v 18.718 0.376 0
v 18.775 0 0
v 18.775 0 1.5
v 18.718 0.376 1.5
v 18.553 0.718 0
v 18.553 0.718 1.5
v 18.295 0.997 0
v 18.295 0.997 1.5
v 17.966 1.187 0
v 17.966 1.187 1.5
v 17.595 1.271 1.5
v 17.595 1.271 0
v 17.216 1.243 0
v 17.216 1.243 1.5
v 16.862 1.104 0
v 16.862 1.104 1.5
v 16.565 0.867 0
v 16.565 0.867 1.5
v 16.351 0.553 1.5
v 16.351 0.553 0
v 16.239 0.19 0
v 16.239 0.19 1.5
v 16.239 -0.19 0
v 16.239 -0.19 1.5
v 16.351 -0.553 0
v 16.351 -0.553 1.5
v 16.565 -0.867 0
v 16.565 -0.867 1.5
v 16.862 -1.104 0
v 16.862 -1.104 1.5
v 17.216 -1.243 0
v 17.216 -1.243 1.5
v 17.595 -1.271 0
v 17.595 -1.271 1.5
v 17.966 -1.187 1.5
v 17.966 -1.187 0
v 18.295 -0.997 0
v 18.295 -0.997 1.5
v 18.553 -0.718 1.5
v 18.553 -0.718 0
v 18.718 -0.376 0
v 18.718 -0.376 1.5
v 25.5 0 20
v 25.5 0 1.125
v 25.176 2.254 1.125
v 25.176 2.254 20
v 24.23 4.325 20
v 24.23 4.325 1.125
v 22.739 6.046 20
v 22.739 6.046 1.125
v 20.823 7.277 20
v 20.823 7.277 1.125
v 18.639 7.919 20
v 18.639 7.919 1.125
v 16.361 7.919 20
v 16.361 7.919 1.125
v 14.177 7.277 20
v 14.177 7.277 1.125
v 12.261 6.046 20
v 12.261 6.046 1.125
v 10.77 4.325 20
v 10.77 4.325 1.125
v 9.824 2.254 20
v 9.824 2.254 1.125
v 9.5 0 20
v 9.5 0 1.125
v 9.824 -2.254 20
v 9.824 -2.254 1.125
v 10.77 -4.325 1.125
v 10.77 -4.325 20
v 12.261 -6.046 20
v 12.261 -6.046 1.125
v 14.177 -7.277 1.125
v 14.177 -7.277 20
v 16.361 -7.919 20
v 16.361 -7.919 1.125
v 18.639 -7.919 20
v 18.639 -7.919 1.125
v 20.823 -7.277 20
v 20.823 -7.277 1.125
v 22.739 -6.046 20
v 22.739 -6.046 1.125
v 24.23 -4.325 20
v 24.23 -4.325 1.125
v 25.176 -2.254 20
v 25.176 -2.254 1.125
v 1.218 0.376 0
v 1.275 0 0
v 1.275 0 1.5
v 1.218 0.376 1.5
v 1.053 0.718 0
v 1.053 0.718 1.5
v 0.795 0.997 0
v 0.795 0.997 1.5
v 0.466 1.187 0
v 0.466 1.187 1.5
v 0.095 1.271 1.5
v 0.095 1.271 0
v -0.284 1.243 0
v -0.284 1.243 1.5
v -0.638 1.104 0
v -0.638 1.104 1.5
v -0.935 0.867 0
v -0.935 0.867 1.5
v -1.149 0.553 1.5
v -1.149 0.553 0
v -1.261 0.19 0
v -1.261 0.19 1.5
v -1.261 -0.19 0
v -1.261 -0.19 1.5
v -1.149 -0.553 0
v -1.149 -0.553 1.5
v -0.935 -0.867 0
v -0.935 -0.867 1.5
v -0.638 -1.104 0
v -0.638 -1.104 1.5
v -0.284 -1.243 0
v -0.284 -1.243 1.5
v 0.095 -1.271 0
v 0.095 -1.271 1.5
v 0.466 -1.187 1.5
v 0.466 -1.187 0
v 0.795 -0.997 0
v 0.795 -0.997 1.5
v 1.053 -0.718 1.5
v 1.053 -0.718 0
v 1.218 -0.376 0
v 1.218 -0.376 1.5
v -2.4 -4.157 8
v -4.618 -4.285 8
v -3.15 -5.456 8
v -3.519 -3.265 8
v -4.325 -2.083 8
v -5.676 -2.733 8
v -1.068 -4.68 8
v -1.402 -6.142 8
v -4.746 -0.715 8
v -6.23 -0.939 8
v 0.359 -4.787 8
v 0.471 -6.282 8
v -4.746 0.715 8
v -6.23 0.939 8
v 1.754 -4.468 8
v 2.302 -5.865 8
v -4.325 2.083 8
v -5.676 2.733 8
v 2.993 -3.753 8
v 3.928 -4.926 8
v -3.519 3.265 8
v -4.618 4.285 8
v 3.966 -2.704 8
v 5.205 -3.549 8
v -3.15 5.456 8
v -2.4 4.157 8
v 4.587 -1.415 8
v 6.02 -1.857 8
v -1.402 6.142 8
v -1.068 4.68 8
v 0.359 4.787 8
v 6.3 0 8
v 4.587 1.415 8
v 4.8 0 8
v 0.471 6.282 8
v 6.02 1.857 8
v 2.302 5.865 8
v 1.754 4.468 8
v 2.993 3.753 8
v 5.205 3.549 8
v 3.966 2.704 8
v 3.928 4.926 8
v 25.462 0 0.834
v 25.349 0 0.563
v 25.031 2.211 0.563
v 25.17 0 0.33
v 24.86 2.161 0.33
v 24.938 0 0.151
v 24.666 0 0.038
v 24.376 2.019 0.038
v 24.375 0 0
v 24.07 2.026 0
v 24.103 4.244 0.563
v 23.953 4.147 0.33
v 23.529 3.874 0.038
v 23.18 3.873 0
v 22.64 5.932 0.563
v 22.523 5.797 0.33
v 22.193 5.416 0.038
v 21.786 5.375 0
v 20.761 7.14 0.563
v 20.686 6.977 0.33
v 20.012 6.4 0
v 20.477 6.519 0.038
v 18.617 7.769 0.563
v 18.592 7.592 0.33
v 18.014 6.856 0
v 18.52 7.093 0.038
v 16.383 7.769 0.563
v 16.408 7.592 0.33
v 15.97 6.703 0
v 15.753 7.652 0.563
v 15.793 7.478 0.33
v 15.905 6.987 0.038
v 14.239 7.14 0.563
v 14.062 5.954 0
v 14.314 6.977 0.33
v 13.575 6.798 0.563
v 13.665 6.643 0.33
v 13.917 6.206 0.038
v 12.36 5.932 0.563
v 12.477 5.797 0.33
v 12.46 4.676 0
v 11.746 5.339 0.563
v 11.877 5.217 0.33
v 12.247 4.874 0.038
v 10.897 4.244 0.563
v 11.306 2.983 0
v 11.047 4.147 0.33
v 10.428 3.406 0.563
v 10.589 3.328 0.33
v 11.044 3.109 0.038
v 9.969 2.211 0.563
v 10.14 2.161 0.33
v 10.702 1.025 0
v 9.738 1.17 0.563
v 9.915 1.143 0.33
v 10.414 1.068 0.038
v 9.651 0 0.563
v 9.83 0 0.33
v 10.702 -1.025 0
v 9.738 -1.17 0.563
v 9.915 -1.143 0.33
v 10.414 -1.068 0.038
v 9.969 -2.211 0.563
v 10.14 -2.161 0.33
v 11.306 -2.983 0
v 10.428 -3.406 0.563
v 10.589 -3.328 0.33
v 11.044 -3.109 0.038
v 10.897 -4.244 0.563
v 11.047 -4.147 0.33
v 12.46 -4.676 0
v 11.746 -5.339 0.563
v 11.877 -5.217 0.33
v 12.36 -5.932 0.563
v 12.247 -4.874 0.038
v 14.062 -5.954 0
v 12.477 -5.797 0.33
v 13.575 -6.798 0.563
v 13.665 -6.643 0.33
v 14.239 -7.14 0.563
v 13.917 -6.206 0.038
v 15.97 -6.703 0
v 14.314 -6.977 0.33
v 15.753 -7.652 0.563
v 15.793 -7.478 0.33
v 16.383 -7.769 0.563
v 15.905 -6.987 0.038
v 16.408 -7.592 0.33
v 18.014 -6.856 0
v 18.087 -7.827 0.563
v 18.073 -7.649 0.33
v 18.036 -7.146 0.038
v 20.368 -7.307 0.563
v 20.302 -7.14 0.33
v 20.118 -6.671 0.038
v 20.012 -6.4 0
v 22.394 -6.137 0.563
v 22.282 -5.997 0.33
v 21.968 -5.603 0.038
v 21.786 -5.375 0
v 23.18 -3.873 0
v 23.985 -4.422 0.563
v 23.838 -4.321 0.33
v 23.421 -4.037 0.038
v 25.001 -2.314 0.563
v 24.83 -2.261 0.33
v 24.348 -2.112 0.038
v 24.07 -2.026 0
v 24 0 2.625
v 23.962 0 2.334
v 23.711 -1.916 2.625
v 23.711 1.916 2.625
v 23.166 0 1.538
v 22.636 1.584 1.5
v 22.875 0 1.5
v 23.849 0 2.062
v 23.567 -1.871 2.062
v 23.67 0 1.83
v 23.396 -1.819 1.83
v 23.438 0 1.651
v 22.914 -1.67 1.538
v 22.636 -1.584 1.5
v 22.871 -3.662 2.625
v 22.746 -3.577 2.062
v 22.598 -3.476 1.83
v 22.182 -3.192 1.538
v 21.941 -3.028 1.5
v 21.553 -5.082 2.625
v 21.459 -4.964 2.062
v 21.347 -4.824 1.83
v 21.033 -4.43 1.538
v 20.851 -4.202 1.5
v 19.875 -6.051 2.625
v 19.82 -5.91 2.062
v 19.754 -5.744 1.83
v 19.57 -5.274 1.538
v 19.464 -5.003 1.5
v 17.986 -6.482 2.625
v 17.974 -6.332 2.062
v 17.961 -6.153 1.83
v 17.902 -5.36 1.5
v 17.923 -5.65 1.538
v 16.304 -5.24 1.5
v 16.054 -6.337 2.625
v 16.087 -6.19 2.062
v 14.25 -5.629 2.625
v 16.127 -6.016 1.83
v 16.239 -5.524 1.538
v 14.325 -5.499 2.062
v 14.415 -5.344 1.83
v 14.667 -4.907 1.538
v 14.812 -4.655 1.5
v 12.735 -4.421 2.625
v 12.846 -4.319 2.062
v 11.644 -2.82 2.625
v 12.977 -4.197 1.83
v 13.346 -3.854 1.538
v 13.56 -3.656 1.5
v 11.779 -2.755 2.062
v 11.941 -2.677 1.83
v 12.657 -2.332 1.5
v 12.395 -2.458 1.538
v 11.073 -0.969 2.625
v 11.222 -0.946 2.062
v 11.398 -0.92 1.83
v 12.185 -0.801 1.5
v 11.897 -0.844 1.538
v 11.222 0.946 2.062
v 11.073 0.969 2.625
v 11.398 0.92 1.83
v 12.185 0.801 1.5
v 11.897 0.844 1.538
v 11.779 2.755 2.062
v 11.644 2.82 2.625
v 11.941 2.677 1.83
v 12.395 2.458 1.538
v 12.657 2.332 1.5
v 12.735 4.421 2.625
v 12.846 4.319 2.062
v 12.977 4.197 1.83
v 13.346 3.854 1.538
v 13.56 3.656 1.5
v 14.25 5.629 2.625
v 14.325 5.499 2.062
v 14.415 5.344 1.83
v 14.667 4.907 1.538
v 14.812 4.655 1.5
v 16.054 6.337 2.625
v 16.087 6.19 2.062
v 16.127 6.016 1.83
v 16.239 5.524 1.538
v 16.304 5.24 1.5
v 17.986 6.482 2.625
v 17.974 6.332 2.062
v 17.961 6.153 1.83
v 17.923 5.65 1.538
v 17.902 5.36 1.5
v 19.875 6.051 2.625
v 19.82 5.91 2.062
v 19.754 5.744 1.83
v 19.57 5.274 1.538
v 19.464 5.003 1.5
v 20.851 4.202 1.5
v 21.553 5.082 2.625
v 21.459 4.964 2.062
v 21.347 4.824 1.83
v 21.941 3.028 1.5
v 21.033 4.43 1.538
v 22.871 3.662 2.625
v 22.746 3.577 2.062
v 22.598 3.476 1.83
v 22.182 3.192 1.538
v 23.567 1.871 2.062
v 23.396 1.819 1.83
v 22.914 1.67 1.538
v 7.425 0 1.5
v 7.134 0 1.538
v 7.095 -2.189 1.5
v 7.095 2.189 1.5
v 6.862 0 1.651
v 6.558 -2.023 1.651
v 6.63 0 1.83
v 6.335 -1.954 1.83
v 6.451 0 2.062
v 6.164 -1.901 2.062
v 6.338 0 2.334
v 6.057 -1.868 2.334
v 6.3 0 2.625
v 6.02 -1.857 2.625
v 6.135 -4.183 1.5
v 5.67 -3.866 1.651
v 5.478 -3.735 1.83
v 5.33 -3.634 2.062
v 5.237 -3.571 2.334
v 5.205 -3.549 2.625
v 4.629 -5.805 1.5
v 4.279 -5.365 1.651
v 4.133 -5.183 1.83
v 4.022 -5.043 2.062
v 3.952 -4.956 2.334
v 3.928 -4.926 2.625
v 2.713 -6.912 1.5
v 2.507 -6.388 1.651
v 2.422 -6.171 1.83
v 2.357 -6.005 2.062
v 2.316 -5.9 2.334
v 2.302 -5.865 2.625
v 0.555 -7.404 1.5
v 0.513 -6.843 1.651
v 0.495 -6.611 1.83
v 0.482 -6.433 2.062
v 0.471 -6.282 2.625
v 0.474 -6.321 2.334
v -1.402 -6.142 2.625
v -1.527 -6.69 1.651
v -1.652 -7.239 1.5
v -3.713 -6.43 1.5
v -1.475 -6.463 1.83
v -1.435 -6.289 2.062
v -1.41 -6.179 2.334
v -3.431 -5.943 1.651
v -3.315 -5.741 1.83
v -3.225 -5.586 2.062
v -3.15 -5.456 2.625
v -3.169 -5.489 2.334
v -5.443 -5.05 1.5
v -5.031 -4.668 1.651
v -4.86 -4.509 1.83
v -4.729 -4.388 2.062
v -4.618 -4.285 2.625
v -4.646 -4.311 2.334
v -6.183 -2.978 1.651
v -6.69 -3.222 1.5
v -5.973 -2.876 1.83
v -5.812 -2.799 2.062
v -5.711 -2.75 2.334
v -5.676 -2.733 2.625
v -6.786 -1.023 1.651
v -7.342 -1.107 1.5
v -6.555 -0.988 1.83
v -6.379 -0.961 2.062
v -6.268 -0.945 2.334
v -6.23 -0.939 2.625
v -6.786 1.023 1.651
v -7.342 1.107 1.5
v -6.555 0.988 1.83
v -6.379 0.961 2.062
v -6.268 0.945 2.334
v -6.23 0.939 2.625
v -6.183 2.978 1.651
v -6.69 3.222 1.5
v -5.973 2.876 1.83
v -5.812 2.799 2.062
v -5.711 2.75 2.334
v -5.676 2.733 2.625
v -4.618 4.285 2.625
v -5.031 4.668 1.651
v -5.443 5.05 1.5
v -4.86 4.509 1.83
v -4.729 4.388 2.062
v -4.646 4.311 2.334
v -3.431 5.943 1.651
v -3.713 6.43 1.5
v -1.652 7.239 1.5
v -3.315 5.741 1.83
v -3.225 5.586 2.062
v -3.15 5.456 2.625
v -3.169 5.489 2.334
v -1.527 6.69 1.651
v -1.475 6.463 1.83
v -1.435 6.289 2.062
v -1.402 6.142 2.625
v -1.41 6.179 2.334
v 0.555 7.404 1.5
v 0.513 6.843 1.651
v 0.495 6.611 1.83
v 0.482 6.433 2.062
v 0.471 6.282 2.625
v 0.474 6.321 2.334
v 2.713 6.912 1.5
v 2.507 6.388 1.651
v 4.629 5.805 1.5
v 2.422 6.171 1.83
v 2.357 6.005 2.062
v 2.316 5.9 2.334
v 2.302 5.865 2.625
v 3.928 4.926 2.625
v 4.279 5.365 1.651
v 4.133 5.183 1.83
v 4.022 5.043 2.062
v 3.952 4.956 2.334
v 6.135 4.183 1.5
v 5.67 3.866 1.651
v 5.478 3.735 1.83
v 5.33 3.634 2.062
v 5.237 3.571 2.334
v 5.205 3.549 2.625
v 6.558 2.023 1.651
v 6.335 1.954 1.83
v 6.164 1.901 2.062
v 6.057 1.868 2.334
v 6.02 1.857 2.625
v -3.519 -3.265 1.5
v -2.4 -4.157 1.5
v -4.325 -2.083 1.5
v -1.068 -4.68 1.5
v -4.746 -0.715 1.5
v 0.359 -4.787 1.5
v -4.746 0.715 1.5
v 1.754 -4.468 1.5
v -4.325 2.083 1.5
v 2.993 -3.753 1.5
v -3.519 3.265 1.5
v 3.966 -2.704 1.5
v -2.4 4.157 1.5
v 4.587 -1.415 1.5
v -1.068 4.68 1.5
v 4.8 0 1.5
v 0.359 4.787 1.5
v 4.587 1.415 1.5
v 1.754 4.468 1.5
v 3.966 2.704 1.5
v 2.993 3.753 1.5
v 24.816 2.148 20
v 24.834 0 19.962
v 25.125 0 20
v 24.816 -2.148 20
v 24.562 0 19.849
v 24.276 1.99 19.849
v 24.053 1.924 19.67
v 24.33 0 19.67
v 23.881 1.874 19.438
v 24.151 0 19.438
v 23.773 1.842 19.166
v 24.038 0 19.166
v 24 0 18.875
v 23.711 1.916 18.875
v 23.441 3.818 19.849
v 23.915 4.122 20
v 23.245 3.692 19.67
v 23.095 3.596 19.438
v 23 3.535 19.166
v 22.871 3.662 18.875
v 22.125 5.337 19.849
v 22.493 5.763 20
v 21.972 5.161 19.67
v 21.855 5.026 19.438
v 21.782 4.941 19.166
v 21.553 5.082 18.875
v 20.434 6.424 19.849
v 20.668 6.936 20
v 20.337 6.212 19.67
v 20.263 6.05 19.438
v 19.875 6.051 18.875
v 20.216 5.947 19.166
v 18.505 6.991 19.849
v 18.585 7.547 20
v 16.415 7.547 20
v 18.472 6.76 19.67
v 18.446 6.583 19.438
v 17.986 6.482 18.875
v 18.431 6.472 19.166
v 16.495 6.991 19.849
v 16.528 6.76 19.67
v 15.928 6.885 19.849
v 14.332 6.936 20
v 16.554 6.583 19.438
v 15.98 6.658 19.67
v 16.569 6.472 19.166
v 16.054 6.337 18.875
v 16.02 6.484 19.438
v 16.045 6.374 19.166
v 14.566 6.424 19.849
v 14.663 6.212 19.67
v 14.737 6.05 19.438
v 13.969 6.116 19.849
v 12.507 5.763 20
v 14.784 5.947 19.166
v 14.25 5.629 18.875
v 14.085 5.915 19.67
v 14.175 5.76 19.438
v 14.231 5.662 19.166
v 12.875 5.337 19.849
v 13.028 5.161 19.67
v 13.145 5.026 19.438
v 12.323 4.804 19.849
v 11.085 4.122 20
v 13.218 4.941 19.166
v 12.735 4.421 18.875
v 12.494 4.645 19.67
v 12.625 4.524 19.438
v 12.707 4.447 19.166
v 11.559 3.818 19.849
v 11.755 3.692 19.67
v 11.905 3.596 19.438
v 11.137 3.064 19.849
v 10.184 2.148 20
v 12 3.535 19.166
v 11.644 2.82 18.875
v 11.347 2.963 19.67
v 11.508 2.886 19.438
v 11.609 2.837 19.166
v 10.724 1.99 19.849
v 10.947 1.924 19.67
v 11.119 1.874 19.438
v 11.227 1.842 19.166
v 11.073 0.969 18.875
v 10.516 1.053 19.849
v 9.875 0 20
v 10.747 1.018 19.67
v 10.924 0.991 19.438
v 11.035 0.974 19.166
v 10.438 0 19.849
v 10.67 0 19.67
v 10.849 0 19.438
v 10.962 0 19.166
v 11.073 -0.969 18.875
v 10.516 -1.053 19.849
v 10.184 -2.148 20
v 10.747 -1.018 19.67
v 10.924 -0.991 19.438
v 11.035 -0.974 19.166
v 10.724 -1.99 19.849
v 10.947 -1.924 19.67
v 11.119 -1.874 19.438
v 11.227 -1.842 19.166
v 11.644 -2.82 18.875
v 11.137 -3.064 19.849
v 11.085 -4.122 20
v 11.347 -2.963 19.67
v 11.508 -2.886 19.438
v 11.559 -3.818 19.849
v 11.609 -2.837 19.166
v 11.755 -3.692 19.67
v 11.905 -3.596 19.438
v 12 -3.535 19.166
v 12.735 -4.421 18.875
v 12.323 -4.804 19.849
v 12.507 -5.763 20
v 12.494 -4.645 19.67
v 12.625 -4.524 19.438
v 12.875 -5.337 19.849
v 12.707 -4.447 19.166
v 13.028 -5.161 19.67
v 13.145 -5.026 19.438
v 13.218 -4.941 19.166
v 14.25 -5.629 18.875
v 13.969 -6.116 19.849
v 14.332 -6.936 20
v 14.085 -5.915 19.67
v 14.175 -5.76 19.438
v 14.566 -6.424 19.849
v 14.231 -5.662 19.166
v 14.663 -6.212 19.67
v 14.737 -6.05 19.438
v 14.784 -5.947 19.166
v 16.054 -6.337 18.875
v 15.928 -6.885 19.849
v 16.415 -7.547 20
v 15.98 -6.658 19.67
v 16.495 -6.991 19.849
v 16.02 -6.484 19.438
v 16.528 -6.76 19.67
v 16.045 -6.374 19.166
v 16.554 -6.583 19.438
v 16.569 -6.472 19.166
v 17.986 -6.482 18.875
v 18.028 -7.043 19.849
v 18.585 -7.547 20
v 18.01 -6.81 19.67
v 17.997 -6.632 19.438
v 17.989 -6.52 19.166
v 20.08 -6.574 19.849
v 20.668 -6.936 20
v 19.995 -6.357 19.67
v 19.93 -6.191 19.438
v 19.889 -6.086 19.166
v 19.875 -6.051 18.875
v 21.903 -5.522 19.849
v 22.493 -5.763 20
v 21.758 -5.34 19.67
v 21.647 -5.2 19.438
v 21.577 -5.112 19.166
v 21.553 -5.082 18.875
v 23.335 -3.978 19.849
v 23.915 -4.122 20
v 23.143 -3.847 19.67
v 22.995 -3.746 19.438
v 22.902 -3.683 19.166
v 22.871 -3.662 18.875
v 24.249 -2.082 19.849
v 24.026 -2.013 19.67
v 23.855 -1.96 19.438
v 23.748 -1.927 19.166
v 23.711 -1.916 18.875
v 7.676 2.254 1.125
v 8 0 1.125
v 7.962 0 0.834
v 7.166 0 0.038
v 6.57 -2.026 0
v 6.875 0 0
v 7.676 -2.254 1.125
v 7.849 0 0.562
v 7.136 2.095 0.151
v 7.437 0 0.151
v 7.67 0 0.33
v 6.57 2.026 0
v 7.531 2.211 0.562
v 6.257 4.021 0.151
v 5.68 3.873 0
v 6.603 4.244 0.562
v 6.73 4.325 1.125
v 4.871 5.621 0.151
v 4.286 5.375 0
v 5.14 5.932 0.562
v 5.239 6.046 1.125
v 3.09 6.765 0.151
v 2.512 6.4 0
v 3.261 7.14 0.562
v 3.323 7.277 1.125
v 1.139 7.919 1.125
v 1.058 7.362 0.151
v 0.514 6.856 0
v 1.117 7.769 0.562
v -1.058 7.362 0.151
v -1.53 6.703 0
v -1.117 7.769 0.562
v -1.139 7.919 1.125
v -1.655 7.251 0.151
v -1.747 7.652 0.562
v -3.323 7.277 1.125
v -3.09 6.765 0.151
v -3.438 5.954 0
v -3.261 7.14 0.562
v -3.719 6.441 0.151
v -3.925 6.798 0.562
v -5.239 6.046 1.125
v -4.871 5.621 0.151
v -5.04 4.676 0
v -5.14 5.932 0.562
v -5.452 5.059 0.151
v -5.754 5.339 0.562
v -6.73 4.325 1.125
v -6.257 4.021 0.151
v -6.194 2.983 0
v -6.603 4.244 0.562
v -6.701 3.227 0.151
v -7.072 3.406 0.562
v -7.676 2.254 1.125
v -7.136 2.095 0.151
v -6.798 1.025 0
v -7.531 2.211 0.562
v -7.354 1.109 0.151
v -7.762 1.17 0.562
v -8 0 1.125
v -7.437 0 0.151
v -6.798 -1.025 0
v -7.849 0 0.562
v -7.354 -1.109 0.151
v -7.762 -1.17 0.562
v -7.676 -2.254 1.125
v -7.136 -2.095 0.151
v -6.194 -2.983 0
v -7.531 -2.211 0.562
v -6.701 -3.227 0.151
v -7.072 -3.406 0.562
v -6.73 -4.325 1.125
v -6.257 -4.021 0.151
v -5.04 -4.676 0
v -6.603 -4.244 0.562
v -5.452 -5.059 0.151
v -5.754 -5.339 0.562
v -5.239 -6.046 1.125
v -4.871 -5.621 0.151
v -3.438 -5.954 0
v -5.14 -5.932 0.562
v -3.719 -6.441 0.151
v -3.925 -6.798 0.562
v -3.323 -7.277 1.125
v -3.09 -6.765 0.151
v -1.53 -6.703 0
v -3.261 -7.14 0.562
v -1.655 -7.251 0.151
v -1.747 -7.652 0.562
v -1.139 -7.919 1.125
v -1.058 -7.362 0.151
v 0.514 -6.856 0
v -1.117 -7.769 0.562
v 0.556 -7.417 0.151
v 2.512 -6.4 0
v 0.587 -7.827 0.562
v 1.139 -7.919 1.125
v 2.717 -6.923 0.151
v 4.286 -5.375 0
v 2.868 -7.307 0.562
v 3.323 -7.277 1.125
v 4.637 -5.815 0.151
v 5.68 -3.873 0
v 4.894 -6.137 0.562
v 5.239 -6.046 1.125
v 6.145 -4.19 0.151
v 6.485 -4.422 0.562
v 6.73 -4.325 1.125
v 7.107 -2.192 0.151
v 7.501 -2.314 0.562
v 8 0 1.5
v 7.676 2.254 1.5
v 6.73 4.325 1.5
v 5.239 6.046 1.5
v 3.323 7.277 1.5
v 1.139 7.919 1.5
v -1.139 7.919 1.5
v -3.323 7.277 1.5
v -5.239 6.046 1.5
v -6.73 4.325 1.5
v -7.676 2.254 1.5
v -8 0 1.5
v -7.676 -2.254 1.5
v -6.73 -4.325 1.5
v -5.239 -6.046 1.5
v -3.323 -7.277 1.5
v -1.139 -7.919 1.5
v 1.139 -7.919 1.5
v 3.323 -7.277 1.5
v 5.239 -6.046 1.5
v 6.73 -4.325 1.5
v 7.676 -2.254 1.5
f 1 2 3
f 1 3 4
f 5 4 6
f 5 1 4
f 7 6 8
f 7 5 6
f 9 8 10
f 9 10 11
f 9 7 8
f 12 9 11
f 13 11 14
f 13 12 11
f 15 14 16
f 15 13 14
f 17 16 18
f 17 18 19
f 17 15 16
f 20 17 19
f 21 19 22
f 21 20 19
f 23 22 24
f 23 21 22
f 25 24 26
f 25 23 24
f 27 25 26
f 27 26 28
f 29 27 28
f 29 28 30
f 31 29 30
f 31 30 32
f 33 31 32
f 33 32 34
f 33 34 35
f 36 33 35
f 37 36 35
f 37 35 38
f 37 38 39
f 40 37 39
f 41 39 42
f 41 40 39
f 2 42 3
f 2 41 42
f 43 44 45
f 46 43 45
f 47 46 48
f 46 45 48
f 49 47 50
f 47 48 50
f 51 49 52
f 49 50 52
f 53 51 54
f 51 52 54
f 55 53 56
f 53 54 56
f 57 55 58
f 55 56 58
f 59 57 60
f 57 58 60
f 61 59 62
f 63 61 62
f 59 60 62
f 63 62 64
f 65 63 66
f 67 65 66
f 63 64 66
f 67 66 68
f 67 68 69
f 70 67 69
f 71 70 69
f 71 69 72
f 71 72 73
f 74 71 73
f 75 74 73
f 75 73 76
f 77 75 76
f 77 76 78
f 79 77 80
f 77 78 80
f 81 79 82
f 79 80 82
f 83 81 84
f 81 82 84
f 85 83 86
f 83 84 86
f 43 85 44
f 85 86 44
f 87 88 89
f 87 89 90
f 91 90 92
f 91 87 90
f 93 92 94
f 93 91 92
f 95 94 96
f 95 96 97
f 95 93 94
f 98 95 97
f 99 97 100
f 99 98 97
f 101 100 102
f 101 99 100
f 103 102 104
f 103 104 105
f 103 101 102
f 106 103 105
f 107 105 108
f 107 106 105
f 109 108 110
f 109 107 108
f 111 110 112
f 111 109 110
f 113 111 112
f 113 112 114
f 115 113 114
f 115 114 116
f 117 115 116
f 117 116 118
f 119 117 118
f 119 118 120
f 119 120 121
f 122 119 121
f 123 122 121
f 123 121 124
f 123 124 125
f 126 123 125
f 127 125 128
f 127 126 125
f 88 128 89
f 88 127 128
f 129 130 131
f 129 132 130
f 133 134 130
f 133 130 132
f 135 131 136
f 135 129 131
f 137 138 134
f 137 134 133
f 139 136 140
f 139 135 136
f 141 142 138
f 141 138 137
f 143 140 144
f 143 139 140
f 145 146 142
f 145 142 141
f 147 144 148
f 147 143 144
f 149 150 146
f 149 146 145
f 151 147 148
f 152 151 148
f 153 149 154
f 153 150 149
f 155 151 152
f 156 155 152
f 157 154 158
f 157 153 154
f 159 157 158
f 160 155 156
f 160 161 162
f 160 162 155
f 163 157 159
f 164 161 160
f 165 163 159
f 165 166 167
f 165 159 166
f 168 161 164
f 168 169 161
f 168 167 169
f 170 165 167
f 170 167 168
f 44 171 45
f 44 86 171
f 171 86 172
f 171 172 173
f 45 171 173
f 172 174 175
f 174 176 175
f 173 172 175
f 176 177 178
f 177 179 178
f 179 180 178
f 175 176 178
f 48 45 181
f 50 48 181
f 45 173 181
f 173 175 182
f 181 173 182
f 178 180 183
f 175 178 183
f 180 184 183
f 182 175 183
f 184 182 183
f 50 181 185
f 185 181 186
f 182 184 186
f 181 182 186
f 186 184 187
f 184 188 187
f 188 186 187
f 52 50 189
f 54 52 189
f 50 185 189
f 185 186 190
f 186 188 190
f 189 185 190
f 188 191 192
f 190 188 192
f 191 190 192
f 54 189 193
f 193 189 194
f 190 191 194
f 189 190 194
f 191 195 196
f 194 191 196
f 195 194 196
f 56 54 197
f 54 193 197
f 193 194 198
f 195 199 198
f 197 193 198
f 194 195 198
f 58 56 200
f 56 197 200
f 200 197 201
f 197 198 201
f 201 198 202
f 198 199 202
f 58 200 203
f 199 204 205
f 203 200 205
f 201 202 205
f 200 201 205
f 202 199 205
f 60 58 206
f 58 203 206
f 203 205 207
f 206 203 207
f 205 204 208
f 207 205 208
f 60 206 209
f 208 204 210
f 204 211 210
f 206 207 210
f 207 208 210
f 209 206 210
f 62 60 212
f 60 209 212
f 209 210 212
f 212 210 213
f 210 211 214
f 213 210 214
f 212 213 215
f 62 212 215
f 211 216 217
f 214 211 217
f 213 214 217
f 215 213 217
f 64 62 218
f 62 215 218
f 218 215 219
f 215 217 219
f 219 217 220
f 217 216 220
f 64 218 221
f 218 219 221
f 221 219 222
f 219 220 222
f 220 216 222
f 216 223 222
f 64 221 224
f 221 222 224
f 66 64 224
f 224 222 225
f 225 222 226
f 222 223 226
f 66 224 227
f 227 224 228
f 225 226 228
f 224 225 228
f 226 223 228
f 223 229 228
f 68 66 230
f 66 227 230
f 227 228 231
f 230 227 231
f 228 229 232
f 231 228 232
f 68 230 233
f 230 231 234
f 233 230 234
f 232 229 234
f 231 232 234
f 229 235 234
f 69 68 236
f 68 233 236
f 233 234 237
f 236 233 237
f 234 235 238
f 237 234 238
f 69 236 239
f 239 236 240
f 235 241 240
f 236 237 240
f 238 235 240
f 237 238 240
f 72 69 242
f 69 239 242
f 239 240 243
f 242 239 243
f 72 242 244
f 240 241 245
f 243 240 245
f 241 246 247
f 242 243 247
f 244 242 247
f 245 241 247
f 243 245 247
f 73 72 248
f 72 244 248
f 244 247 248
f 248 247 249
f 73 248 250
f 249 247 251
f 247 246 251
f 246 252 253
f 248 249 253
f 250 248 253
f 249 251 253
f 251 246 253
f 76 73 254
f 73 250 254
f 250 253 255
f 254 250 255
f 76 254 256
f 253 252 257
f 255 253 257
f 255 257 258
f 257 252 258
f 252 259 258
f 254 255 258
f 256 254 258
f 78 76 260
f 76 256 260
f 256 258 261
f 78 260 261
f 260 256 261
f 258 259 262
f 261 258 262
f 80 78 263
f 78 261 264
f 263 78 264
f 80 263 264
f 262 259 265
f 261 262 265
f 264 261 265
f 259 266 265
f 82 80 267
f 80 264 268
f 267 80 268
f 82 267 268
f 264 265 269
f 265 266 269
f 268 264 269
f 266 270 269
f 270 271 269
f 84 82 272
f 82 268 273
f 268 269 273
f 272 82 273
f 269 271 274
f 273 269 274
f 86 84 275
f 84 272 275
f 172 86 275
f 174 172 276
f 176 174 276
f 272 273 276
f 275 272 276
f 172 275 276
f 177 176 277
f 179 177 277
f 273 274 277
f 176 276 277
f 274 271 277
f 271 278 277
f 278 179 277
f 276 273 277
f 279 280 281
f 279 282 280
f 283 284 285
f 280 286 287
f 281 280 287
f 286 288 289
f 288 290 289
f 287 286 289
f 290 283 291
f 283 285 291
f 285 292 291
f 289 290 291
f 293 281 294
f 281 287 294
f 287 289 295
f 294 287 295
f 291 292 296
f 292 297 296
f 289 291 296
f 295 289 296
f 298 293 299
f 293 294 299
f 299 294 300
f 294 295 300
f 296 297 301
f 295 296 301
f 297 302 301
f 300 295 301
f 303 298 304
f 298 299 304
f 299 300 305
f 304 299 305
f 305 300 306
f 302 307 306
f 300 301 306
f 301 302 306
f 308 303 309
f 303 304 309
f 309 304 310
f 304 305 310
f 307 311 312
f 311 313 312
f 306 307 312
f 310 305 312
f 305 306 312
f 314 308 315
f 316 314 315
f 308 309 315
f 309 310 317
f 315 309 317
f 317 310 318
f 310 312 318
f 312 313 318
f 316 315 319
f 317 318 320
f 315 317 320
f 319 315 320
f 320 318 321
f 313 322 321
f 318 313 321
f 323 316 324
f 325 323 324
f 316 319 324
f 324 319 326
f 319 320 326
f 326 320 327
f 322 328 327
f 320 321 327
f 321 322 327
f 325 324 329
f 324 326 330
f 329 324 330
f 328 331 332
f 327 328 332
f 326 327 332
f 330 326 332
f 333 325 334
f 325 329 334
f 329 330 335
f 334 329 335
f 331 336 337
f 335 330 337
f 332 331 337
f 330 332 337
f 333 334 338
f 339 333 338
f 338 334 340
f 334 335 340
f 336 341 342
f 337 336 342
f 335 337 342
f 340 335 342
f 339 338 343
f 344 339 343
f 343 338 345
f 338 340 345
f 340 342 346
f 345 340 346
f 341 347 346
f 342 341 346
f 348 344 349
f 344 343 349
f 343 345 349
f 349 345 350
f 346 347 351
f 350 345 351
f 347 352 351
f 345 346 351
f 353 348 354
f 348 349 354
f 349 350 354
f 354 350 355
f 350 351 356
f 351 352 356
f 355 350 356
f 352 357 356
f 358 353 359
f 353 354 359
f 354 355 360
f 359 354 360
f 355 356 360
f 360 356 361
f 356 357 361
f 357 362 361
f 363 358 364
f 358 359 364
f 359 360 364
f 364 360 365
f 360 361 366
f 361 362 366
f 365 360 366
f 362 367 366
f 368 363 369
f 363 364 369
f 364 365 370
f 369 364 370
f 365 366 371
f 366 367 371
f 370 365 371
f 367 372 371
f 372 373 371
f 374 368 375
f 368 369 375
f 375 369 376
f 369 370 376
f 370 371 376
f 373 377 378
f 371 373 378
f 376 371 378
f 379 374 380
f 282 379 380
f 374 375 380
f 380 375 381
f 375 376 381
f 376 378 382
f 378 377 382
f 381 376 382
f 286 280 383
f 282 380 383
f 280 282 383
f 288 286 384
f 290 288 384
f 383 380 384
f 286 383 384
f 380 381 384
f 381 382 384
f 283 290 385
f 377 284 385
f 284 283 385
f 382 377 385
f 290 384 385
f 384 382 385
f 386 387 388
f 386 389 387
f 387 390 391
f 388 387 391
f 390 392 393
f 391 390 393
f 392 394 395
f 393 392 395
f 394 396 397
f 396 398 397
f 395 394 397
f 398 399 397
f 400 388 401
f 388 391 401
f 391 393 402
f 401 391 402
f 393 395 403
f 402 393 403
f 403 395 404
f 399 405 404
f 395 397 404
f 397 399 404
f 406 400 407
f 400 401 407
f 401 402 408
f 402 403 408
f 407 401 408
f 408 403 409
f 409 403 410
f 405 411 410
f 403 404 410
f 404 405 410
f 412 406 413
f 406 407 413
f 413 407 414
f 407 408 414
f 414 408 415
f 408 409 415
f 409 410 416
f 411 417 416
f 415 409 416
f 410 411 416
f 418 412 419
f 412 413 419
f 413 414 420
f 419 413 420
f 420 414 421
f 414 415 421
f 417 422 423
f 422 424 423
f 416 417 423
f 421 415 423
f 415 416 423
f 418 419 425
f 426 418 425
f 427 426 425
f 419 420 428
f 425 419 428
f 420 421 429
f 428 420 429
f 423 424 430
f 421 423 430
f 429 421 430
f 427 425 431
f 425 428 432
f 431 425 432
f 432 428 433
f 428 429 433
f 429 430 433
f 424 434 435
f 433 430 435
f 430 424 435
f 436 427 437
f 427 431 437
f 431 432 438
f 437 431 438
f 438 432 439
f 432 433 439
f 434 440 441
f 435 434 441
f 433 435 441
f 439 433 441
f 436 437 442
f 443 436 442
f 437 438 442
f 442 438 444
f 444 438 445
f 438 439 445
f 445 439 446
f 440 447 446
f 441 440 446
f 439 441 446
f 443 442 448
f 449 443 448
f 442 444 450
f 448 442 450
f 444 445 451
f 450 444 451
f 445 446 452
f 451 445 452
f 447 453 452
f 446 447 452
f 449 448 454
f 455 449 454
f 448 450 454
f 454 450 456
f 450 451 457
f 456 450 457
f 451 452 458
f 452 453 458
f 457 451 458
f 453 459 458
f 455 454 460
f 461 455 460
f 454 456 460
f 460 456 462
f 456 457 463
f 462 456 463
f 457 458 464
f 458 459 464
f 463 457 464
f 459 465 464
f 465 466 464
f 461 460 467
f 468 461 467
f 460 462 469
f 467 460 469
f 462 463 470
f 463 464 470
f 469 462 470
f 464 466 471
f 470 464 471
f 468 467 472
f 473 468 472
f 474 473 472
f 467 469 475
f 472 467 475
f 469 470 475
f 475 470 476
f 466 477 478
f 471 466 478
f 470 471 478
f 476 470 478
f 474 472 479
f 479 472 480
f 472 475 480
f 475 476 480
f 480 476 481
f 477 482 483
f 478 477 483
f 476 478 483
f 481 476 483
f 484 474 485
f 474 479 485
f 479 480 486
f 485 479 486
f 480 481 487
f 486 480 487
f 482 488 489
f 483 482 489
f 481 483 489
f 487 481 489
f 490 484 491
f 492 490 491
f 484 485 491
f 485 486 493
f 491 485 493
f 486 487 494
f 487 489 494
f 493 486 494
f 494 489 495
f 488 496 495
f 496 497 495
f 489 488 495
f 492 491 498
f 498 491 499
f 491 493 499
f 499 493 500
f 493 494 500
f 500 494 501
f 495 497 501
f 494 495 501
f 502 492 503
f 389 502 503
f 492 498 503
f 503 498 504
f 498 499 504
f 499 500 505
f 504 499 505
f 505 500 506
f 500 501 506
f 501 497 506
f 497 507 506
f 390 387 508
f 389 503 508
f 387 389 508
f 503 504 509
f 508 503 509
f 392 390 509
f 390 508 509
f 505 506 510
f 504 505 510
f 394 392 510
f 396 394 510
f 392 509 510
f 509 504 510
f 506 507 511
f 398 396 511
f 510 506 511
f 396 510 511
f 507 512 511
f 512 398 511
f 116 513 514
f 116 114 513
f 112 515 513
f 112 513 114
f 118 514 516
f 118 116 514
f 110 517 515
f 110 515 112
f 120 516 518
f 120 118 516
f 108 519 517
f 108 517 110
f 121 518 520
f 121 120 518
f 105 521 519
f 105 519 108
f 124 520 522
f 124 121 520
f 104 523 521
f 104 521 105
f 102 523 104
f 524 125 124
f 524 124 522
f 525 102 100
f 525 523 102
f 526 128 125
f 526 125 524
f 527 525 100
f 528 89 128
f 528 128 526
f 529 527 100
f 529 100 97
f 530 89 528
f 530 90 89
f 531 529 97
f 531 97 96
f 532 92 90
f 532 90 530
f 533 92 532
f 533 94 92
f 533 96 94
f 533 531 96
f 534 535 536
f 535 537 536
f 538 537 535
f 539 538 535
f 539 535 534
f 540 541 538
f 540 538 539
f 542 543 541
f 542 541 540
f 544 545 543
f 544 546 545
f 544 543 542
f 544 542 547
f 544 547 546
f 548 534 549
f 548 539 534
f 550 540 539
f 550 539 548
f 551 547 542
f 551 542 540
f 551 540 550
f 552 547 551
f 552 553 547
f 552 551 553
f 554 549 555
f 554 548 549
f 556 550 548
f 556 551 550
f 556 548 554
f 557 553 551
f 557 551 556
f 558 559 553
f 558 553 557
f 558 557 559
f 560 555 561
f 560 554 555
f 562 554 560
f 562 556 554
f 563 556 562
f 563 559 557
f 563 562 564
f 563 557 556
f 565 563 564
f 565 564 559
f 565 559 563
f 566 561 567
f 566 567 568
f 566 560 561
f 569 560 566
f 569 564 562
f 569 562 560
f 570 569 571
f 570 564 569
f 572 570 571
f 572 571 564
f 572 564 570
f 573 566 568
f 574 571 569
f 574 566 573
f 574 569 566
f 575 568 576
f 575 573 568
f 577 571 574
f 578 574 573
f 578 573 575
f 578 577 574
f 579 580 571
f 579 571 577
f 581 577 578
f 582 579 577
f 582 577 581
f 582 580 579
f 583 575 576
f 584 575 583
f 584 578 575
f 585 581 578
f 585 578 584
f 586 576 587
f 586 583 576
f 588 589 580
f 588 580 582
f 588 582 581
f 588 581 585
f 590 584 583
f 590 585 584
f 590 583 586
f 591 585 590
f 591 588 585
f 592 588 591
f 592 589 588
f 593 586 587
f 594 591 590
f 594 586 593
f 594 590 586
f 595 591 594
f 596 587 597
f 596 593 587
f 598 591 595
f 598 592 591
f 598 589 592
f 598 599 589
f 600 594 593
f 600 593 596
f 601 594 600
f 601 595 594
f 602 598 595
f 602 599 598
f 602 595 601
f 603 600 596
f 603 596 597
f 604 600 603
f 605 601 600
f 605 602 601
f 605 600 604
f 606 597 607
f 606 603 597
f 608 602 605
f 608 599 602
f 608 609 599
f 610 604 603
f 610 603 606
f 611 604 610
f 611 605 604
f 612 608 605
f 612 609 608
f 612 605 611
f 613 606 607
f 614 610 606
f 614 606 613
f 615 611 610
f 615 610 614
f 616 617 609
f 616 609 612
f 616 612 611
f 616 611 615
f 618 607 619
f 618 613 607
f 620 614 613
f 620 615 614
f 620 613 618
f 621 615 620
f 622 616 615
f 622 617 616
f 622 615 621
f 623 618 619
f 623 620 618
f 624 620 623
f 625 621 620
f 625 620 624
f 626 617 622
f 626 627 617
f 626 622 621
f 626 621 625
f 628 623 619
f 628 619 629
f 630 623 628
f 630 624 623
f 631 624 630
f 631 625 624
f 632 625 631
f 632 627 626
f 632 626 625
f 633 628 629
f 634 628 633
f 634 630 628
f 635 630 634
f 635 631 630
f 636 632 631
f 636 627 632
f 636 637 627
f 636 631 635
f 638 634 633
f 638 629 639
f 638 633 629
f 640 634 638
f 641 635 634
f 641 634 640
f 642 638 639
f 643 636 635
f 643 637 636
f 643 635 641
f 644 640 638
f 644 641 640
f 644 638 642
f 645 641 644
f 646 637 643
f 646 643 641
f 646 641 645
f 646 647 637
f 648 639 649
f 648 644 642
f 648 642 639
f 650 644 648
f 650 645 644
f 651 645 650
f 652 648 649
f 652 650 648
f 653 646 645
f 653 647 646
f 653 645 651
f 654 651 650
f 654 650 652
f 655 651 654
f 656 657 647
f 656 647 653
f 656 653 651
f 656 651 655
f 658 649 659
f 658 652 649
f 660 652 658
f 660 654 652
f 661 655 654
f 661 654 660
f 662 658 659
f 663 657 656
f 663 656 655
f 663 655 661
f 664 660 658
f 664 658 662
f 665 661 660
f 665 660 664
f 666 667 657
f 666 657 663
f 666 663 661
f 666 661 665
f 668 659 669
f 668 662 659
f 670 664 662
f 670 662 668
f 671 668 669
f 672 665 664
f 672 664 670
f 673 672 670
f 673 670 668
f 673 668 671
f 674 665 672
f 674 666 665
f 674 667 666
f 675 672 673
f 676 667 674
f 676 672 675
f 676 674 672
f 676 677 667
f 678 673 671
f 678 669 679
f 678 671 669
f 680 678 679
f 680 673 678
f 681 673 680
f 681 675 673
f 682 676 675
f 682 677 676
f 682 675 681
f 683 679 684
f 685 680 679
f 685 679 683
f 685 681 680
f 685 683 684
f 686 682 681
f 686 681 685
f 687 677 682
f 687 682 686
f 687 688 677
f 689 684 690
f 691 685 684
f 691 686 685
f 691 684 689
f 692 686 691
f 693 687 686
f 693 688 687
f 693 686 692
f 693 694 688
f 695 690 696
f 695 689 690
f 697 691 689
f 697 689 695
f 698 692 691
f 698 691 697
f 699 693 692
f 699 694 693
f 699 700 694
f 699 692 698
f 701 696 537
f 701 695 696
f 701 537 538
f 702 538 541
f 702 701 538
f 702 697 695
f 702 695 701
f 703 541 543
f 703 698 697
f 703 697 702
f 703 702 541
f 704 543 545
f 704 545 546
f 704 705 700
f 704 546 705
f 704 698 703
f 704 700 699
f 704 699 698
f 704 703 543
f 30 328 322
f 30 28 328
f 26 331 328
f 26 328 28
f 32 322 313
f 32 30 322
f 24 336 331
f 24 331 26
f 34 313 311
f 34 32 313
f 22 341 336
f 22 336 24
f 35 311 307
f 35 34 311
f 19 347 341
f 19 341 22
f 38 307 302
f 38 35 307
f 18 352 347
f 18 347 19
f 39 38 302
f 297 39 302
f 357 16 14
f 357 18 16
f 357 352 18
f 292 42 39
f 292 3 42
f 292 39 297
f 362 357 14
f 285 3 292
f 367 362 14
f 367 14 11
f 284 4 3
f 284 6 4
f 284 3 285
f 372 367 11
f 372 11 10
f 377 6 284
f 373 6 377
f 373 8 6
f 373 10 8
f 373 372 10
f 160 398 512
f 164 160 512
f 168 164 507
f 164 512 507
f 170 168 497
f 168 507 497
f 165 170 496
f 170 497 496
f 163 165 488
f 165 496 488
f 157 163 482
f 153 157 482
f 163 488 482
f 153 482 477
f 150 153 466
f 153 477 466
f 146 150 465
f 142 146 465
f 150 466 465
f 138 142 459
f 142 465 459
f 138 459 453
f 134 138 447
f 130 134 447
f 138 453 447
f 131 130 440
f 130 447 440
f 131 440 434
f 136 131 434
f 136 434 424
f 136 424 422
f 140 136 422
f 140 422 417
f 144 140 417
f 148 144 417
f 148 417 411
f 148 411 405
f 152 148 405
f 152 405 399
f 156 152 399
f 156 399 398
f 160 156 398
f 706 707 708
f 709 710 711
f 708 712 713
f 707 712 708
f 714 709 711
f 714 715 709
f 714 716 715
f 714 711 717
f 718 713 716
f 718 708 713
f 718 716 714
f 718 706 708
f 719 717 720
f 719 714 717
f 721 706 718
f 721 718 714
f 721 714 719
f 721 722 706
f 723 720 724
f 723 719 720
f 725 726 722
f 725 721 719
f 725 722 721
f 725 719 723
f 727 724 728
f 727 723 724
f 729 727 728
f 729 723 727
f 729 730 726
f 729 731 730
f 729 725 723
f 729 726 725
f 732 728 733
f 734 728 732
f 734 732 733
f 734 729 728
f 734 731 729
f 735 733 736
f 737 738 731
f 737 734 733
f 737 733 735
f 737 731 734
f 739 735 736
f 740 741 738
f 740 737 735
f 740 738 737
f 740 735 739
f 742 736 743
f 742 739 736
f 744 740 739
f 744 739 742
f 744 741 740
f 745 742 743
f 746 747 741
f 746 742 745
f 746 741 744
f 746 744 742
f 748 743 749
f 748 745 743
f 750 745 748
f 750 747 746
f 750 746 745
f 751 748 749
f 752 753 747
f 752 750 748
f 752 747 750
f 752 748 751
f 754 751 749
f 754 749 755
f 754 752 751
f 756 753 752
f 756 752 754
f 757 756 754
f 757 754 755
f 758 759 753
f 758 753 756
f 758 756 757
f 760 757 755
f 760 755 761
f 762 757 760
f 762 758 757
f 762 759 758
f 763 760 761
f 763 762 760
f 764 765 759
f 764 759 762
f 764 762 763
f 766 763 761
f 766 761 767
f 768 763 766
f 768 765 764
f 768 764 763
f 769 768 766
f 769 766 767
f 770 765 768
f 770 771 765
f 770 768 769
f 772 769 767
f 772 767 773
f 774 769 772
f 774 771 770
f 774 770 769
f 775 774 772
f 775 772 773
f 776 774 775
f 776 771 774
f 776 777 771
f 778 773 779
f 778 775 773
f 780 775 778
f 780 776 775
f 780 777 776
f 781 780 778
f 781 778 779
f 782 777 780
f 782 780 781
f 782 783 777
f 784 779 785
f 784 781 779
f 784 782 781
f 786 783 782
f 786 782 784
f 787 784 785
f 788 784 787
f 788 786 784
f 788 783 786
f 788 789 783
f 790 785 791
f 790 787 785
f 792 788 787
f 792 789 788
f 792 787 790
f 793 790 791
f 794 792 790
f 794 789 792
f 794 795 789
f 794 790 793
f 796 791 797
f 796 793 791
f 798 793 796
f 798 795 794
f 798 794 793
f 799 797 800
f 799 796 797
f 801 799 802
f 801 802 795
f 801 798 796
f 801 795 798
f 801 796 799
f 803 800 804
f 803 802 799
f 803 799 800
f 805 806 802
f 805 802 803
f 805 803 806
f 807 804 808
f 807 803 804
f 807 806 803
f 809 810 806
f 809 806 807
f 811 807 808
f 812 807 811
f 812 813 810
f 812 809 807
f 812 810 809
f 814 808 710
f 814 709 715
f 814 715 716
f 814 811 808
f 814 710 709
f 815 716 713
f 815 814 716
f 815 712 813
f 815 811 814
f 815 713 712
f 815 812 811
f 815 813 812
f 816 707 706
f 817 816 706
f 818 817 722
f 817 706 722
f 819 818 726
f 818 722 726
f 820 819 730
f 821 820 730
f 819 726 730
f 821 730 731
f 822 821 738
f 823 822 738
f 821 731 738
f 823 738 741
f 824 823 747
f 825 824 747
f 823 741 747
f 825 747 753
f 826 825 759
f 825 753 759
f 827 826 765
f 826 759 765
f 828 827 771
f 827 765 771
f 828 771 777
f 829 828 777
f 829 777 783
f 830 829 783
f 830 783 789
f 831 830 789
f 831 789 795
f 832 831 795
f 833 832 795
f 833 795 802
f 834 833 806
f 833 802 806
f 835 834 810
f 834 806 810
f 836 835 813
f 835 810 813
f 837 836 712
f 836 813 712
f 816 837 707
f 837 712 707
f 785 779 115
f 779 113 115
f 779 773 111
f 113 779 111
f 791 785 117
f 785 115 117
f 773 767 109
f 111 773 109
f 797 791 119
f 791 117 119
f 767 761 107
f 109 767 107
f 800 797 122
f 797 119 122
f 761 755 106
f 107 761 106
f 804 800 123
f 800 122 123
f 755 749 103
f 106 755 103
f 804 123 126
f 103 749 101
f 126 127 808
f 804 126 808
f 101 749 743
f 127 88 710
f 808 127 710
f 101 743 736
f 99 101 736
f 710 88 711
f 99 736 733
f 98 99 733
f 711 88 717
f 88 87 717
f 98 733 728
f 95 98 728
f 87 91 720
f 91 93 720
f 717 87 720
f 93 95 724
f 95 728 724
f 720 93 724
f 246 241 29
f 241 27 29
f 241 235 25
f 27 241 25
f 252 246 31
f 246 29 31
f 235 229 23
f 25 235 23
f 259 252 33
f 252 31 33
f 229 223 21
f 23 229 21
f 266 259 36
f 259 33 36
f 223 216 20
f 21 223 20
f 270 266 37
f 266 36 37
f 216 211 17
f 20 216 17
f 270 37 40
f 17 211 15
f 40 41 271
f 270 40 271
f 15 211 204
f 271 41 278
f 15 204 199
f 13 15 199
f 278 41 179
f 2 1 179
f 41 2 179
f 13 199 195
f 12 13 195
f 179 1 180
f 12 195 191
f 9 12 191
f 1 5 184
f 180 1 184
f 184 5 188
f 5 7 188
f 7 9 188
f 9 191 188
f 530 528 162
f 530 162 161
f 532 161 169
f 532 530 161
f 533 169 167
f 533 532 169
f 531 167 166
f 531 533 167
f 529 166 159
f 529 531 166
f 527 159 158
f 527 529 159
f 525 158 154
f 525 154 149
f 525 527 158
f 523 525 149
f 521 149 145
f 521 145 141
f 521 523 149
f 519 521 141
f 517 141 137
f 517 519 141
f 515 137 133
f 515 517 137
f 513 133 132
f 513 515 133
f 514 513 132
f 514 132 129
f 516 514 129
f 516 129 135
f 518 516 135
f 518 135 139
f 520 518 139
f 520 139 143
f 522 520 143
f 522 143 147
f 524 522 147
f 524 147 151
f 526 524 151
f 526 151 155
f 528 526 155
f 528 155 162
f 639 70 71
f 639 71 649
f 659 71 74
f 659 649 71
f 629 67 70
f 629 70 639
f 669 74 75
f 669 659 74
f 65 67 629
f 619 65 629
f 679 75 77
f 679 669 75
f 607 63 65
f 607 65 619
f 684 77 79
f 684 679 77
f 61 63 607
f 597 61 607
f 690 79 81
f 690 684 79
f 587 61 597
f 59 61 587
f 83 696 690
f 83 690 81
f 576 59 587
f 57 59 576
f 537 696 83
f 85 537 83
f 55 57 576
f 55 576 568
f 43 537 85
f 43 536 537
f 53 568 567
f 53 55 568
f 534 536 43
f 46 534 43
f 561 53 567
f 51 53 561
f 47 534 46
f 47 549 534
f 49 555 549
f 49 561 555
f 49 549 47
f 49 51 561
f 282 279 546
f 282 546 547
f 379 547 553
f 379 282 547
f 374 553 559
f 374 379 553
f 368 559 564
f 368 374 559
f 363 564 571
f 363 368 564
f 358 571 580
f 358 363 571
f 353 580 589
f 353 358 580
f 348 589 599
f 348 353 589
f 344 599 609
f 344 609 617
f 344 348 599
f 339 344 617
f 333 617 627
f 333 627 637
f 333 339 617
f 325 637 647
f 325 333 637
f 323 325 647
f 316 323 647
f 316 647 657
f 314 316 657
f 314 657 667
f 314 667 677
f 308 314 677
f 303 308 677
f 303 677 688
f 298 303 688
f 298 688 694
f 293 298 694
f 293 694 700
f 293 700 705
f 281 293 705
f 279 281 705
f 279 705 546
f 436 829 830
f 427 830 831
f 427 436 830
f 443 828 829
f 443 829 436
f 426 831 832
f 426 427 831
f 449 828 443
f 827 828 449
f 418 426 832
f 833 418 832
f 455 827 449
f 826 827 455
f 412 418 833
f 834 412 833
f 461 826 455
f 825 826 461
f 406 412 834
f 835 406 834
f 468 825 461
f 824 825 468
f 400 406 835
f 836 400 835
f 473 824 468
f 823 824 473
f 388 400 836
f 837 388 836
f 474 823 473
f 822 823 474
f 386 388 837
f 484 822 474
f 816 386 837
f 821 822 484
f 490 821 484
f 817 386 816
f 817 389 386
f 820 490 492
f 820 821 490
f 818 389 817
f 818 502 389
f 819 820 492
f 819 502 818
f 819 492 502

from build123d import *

# Parameters (mm, degrees)
F4_R     = 8
F4_R_2   = 6.5
F4_R_3   = 6.3
F4_R_4   = 4.8
F4_R_5   = 1.275
F5_DEPTH = 1.5
F6_DEPTH = 20
F8_DEPTH = 1.5
F9_DEPTH = 8
F10_R    = 1.125
F10_2_R  = 1.125


with BuildPart() as f5:
    # F4 (on Top) → F5 (new body)
    with BuildSketch(Plane.XY):
        Circle(F4_R)
        Circle(F4_R_2, mode=Mode.SUBTRACT)
        Circle(F4_R_2)
        Circle(F4_R_3, mode=Mode.SUBTRACT)
        Circle(F4_R_3)
        Circle(F4_R_4, mode=Mode.SUBTRACT)
        Circle(F4_R_4)
        Circle(F4_R_5, mode=Mode.SUBTRACT)
    extrude(amount=F5_DEPTH)

    # F4 (on Top) → F6 (join)
    with BuildSketch(Plane.XY):
        Circle(F4_R)
        Circle(F4_R_2, mode=Mode.SUBTRACT)
    extrude(amount=F6_DEPTH)


with BuildPart() as f5_1:
    # F7: moved
    add(f5.part.moved(Location((17.5, 0, 0))))

    # F10
    f10_edges = [f5_1.edges().sort_by_distance(p)[0] for p in [
        (9.5, 0, 0),
        (11, 0, 20),
        (11, 0, 1.5),
    ]]
    fillet(f10_edges, radius=F10_R)


with BuildPart() as f8:
    # F4 (on Top) → F8 (new body)
    with BuildSketch(Plane.XY):
        Circle(F4_R)
        Circle(F4_R_2, mode=Mode.SUBTRACT)
        Circle(F4_R_2)
        Circle(F4_R_3, mode=Mode.SUBTRACT)
        Circle(F4_R_3)
        Circle(F4_R_4, mode=Mode.SUBTRACT)
        Circle(F4_R_4)
        Circle(F4_R_5, mode=Mode.SUBTRACT)
    extrude(amount=F8_DEPTH)

    # F4 (on Top) → F9 (join)
    with BuildSketch(Plane.XY):
        Circle(F4_R_3)
        Circle(F4_R_4, mode=Mode.SUBTRACT)
    extrude(amount=F9_DEPTH)

    # F10#2
    f10_2_edges = [f8.edges().sort_by_distance(p)[0] for p in [
        (-8, 0, 0),
        (-6.3, 0, 1.5),
    ]]
    fillet(f10_2_edges, radius=F10_2_R)


solid = Compound([f5_1.part, f8.part])
